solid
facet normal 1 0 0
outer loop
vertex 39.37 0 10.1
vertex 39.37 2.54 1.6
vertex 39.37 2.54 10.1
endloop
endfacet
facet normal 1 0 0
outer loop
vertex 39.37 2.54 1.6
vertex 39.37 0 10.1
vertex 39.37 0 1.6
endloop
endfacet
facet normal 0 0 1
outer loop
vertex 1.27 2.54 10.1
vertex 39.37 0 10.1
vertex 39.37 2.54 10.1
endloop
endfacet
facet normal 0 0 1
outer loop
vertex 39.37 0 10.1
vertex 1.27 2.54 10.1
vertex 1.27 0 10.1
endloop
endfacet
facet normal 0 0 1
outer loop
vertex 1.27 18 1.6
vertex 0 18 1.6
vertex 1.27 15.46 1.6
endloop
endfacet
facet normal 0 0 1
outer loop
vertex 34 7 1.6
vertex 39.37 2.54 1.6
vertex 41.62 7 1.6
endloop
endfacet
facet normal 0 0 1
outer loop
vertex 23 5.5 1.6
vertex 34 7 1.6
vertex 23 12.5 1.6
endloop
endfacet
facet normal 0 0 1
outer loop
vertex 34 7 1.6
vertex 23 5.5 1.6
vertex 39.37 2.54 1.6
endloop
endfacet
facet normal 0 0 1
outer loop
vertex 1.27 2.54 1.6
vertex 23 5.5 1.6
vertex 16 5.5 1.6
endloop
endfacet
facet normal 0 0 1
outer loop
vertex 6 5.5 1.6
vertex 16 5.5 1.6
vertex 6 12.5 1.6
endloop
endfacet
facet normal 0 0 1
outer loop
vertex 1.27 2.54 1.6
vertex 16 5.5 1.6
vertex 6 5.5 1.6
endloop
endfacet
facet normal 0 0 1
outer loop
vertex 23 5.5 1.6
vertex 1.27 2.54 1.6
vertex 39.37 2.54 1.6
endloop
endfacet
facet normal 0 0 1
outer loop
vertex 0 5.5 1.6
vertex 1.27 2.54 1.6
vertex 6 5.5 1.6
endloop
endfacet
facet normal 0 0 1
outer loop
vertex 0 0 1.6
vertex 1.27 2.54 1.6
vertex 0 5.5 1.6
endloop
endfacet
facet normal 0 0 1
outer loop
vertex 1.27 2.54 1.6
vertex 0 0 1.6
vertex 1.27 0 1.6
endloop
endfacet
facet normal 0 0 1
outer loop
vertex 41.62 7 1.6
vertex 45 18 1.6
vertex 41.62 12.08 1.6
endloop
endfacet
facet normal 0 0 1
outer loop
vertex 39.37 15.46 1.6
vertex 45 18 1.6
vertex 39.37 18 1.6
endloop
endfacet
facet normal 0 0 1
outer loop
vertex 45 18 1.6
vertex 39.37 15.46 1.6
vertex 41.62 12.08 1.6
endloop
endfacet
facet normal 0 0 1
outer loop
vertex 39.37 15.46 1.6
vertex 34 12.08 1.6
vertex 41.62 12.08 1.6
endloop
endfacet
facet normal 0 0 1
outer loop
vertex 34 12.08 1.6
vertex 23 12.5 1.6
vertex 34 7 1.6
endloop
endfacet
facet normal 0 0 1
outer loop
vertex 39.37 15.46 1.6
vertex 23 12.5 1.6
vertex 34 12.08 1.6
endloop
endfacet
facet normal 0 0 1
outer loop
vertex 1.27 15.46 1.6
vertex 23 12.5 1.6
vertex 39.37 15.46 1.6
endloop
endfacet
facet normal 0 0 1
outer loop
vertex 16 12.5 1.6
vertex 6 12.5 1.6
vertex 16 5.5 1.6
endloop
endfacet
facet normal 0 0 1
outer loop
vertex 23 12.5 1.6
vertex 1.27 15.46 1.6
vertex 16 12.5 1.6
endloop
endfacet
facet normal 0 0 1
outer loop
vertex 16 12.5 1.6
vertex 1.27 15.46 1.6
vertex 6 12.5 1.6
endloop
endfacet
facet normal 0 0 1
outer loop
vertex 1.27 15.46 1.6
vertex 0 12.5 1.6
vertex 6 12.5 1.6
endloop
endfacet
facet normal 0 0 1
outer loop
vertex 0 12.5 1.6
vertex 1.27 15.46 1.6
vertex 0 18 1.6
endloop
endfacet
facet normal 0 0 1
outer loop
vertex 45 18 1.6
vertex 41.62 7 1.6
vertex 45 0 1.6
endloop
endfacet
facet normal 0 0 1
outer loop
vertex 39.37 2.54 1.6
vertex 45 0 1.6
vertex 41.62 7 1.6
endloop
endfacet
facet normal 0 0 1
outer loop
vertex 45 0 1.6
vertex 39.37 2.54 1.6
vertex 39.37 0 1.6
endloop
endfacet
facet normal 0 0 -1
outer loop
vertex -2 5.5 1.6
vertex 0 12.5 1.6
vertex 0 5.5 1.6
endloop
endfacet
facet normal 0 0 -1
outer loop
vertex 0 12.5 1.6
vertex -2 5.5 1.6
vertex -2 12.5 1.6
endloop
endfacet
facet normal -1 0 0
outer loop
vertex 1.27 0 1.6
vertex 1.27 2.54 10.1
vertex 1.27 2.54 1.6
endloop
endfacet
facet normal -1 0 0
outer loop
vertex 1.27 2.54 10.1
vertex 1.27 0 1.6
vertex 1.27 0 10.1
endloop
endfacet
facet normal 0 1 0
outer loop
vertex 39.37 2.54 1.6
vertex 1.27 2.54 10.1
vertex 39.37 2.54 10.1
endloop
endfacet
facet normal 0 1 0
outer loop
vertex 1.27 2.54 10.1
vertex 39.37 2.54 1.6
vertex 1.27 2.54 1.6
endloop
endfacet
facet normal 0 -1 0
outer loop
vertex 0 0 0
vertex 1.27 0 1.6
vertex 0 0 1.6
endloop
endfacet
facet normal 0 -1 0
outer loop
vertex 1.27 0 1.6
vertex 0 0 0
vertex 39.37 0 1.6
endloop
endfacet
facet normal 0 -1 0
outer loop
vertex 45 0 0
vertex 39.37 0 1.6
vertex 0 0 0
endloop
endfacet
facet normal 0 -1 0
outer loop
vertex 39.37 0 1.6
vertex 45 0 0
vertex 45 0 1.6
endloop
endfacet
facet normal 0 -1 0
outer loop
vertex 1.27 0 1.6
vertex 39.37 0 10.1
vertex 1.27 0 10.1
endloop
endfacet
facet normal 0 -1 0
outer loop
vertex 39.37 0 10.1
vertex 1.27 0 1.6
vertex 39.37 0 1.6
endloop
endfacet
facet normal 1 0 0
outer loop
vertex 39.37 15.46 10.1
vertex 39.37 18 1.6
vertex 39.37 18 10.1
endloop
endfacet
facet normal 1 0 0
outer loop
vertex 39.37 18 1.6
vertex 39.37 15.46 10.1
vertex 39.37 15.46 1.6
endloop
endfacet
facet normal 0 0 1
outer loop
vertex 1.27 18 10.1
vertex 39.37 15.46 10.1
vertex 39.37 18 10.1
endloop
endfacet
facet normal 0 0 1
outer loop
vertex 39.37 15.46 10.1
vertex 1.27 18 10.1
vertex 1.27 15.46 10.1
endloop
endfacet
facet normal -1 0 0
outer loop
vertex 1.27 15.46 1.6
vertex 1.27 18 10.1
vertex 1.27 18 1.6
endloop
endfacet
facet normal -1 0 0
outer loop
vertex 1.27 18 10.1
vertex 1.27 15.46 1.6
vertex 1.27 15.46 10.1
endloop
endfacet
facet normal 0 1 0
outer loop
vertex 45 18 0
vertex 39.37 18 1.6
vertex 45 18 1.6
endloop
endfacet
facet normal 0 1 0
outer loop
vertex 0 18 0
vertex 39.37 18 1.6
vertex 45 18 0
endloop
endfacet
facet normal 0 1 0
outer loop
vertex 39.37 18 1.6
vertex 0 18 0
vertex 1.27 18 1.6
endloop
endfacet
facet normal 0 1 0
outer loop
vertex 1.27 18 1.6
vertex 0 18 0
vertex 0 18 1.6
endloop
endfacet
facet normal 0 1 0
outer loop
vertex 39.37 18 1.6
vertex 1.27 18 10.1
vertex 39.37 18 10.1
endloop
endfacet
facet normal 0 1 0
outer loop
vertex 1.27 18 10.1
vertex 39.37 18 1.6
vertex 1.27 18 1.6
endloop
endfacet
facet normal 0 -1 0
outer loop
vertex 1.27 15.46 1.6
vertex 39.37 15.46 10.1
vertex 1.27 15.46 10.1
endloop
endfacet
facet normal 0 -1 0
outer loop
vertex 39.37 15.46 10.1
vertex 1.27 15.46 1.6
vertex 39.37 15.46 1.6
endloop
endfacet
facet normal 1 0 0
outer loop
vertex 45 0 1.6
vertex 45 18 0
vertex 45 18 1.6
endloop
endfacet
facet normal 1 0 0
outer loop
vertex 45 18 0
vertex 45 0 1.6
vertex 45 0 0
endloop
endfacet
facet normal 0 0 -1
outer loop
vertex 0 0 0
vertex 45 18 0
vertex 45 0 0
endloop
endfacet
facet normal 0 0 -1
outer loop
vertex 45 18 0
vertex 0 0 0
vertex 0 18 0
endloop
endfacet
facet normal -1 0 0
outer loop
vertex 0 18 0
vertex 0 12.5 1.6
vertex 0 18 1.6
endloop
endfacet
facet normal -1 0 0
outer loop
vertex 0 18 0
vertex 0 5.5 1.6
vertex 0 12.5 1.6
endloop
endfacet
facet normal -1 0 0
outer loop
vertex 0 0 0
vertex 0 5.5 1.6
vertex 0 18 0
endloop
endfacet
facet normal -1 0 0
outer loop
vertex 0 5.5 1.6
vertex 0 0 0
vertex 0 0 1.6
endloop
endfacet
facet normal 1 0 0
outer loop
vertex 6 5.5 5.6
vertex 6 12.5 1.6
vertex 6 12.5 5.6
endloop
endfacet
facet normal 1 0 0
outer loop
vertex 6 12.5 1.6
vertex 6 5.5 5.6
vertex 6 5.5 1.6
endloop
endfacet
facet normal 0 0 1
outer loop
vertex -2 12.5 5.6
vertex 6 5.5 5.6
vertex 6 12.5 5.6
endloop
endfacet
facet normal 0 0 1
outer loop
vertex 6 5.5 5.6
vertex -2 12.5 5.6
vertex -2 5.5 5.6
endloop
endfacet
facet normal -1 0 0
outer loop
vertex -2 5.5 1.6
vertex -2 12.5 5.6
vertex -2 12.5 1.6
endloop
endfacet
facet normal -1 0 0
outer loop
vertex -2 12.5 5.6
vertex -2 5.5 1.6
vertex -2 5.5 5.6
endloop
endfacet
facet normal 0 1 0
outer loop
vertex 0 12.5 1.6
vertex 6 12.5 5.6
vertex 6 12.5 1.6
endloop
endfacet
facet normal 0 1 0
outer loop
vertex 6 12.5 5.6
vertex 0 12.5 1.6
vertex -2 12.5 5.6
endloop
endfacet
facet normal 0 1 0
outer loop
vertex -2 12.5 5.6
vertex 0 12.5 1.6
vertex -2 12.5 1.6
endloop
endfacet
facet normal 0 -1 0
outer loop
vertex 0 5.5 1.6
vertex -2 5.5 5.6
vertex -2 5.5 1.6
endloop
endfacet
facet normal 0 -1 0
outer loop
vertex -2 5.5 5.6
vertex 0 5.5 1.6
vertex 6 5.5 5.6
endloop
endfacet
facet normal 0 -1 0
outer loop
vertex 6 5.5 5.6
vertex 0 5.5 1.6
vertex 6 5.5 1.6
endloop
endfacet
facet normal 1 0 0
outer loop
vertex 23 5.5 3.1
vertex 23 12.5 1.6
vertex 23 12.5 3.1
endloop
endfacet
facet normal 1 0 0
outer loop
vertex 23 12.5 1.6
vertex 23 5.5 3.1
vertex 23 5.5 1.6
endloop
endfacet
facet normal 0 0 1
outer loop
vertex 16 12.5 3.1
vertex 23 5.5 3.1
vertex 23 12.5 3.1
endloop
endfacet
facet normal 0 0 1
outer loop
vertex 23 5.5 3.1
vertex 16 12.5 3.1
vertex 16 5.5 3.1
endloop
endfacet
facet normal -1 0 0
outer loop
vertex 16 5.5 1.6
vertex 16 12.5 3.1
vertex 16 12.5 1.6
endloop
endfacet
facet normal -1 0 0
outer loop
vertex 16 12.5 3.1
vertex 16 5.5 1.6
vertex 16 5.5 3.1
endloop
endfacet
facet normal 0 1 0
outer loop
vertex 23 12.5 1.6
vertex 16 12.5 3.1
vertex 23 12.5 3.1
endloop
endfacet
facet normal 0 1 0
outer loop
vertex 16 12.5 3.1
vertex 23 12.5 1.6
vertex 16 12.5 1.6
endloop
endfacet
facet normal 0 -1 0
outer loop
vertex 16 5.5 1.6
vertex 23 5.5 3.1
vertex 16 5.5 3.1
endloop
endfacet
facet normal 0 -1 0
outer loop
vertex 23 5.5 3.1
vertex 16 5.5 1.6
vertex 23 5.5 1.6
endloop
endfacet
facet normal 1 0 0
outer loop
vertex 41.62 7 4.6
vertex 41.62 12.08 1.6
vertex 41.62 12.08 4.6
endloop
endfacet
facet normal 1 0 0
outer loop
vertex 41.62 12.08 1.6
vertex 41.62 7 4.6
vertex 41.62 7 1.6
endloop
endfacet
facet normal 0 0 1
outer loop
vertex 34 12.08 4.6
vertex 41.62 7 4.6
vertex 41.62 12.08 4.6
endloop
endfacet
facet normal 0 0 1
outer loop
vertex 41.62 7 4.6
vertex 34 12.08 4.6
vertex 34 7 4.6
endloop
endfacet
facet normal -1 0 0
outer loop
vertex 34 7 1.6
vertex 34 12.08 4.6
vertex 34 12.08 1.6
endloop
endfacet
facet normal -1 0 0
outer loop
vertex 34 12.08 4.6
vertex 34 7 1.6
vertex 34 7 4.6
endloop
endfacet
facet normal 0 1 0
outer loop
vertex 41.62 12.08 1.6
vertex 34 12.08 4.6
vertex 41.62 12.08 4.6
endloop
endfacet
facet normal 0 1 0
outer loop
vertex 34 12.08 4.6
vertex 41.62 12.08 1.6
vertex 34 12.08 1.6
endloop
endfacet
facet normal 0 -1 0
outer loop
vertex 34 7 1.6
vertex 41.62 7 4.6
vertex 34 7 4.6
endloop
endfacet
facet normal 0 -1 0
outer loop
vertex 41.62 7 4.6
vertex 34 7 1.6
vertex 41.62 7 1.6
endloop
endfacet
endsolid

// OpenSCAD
$fn = 32;
pcb_w = 45.0; pcb_h = 18.0; pcb_t = 1.6;

// PCB
color("green") cube([pcb_w, pcb_h, pcb_t]);

// Pin headers: 2x 15-pin along long edges
color([0.2,0.2,0.2]) {
    translate([1.27, 0, pcb_t]) cube([15*2.54, 2.54, 8.5]);
    translate([1.27, pcb_h-2.54, pcb_t]) cube([15*2.54, 2.54, 8.5]);
}

// Mini-USB connector
color("silver") translate([-2.0, (pcb_h-7)/2, pcb_t]) cube([8, 7, 4]);

// ATmega328P
color([0.1,0.1,0.1]) translate([16.0, 5.5, pcb_t]) cube([7, 7, 1.5]);

// ICSP 2x3 header
color([0.2,0.2,0.2]) translate([34.0, 7.0, pcb_t]) cube([3*2.54, 2*2.54, 3.0]);
